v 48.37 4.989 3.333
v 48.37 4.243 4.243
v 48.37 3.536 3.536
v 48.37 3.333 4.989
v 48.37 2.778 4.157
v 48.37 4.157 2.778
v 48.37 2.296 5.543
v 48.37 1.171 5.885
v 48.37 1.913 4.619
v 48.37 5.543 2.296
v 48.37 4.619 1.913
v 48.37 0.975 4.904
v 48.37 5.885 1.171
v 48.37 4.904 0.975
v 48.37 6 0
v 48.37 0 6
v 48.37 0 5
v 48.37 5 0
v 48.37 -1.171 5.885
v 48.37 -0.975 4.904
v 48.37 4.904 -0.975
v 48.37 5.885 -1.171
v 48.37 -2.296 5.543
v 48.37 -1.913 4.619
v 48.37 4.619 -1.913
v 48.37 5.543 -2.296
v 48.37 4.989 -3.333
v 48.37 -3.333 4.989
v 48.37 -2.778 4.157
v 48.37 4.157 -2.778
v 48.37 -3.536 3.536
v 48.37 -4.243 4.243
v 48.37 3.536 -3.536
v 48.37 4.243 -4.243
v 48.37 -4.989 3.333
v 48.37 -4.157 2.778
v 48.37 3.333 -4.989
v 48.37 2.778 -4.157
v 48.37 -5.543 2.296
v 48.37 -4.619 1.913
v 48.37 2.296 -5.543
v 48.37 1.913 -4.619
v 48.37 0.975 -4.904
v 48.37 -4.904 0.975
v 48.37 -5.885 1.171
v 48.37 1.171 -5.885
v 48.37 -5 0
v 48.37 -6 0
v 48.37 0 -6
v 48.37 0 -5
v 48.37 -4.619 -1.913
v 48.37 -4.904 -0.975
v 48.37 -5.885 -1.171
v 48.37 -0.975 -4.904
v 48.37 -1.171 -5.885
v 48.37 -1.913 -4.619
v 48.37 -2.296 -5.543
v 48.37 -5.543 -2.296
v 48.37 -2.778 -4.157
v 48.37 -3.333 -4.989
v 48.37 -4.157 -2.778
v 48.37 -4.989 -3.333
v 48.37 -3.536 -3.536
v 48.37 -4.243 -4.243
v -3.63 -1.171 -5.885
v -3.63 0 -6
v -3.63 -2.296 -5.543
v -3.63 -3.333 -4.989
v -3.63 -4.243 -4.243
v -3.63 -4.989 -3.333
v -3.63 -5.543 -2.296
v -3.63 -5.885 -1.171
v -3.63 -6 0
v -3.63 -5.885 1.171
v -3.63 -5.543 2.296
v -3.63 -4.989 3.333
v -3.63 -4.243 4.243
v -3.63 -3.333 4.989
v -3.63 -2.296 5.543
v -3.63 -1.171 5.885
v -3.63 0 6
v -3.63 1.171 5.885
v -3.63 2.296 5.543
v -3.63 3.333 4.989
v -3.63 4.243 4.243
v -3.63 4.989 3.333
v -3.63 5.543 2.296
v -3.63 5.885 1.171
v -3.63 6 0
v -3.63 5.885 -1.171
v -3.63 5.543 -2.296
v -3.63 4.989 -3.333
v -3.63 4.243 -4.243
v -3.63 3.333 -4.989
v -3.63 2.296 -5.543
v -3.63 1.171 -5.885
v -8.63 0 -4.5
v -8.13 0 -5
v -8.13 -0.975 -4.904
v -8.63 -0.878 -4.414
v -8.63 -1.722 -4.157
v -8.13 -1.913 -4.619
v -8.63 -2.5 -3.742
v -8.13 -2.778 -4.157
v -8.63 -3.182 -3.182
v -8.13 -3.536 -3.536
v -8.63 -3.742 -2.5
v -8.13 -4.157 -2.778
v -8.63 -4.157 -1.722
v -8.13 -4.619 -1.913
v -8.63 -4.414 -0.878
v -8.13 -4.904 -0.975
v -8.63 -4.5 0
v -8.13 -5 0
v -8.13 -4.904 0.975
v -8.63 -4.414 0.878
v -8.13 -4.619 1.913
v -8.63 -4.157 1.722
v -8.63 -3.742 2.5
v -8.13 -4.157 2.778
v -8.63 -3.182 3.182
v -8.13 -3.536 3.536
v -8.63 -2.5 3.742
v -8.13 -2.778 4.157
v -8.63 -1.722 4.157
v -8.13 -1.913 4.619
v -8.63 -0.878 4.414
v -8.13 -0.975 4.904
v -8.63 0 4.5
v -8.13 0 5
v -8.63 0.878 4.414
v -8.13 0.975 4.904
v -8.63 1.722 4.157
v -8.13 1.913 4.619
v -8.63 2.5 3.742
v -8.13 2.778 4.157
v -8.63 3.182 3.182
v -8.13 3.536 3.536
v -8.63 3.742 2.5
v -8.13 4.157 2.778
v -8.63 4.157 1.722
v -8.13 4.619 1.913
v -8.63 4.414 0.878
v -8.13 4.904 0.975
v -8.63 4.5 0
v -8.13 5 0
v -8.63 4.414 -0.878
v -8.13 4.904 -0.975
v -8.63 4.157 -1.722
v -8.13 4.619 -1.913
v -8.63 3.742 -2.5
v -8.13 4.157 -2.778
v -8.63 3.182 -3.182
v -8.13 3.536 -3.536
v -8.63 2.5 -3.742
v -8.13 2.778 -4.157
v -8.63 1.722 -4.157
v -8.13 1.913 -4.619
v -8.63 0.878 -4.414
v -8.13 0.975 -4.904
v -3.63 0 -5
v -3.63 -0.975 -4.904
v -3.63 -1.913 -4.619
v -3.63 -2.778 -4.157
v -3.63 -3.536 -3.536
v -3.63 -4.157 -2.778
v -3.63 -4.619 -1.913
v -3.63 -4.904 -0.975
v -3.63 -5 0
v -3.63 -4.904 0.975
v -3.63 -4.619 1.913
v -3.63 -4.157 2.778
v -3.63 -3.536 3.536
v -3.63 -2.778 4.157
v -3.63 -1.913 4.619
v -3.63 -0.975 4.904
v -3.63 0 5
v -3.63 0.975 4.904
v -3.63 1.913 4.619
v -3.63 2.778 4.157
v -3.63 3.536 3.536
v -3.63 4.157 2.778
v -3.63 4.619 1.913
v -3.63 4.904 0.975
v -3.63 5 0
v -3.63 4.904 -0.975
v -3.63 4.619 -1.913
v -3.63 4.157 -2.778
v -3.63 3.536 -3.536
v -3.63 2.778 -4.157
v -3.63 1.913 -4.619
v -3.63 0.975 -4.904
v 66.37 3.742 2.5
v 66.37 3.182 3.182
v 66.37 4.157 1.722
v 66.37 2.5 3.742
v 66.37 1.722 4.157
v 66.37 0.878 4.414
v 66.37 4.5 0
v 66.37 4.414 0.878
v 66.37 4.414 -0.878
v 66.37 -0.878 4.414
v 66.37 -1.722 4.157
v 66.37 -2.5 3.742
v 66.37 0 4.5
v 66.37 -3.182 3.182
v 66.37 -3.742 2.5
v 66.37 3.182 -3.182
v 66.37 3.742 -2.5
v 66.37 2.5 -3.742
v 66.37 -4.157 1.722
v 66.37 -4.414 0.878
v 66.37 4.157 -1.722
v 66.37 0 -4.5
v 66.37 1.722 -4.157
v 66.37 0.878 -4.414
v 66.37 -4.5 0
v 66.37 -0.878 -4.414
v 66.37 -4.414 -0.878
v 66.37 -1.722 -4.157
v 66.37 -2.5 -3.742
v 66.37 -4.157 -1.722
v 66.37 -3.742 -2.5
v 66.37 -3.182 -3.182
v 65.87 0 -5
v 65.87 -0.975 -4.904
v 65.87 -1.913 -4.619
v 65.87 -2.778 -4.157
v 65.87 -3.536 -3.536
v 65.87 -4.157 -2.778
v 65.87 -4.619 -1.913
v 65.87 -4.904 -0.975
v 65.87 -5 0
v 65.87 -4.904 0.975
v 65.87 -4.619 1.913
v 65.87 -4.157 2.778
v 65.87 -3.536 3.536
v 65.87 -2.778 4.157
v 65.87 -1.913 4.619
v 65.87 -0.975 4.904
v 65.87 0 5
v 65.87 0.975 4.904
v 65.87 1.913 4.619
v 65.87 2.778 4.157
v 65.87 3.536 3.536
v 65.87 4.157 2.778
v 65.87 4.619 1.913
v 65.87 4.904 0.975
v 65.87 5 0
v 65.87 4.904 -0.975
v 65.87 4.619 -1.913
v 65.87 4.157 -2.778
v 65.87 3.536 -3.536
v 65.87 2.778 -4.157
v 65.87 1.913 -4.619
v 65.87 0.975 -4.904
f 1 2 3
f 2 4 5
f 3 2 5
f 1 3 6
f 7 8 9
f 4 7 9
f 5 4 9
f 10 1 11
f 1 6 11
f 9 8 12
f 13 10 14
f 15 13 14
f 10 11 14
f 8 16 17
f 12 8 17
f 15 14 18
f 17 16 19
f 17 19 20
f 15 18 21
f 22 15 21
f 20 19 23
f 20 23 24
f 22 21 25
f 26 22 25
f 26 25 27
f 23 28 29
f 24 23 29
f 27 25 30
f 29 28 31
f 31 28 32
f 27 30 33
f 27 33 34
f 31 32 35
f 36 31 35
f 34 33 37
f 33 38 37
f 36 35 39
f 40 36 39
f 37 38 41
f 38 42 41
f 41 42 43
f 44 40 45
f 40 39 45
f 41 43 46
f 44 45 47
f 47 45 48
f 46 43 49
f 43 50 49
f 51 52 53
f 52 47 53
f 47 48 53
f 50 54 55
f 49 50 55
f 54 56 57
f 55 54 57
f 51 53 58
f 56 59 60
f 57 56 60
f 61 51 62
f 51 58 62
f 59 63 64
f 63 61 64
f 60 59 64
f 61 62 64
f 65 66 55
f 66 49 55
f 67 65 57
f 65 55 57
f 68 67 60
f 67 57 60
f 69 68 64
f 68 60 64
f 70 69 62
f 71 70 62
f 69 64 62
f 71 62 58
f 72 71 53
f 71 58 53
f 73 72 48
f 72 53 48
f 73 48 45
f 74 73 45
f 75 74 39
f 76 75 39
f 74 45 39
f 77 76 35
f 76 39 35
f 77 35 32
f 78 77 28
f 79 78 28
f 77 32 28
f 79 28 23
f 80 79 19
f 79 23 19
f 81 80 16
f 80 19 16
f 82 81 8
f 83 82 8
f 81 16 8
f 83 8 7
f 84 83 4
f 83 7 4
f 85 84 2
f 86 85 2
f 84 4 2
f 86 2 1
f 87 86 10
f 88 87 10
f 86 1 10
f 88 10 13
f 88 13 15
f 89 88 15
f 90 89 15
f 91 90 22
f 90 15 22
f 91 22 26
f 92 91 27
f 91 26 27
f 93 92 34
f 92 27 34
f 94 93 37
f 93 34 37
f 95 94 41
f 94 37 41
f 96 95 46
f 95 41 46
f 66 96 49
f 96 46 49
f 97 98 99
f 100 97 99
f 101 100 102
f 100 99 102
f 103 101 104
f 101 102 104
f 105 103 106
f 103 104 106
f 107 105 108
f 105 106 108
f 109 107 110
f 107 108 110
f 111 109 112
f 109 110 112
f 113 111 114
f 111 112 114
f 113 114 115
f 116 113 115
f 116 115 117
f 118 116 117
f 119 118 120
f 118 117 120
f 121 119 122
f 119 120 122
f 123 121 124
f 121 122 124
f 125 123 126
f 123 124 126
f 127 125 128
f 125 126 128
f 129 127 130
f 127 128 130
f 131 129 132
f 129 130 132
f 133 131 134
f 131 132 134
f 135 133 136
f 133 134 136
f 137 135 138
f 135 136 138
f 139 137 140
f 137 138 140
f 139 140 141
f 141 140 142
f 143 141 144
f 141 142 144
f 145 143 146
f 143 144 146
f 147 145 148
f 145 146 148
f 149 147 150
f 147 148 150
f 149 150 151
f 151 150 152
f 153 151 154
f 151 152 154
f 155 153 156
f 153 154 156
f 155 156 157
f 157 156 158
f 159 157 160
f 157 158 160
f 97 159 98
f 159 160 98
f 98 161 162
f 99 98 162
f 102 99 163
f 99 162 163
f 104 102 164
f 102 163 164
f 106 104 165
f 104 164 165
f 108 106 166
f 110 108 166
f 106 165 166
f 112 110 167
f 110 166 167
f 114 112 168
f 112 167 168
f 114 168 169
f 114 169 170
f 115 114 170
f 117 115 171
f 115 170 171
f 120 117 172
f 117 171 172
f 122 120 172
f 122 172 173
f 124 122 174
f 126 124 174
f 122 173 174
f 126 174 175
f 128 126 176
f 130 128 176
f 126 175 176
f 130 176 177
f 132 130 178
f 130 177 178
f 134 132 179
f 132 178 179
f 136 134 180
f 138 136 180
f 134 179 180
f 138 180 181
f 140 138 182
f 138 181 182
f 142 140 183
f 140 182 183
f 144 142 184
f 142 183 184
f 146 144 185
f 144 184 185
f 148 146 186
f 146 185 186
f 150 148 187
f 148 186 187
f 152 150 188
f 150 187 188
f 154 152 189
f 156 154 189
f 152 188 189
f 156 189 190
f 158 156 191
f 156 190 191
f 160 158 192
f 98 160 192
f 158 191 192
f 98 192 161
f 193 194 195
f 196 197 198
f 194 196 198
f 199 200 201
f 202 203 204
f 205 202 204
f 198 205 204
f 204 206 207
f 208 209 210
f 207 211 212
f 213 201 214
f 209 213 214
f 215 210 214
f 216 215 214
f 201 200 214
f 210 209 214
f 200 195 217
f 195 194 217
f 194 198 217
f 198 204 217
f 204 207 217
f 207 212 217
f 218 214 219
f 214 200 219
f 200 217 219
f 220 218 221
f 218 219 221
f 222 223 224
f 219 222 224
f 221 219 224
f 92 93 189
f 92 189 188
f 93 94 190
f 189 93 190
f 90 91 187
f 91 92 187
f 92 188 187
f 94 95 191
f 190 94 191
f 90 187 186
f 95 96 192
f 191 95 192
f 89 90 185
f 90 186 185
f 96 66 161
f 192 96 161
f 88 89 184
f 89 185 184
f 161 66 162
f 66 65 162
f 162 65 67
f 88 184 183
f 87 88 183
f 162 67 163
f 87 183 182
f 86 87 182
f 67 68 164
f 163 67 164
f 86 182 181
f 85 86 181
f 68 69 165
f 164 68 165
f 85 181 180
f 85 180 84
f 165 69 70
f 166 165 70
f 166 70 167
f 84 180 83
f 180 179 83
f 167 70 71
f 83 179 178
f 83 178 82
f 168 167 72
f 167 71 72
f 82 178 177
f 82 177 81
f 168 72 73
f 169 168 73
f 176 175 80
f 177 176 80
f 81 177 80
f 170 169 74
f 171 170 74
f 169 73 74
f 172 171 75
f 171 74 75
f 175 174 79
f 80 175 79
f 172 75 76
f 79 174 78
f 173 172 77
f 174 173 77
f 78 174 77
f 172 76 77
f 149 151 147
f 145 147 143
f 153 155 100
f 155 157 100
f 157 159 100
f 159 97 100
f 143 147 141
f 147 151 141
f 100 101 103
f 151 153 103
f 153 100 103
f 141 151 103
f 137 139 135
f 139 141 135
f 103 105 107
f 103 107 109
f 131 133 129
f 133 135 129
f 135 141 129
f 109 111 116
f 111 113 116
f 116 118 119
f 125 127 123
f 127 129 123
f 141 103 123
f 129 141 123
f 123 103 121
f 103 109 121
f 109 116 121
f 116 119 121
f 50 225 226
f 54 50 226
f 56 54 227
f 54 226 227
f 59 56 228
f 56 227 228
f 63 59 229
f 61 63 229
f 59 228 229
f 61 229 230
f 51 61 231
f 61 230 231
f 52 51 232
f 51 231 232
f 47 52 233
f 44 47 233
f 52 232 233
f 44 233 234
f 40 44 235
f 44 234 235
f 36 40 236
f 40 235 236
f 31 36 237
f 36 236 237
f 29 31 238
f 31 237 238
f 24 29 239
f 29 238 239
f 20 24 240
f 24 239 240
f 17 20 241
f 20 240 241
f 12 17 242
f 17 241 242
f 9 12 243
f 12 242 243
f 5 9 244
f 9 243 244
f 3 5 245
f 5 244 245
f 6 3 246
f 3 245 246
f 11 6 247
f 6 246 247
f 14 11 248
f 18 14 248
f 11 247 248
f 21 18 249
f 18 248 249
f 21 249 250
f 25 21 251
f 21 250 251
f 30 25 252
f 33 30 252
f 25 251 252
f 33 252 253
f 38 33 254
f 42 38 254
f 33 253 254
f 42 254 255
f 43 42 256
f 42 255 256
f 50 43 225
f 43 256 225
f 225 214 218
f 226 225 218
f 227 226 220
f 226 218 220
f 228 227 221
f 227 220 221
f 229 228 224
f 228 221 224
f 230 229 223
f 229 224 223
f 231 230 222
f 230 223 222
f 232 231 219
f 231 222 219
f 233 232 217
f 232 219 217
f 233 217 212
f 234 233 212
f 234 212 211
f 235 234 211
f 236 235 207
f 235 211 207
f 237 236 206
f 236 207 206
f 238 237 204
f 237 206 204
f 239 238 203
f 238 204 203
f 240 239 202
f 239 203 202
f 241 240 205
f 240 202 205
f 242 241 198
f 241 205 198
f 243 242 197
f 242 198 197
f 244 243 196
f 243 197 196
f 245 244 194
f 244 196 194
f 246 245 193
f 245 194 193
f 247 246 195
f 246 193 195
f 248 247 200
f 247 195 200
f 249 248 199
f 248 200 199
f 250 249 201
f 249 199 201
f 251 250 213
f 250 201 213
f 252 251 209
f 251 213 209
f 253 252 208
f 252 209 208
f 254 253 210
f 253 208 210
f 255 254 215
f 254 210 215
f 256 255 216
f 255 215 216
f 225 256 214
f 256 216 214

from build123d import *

# Parameters (mm, degrees)
CHAMFER_1_SIZE = 0.5


with BuildPart() as part:
    # 草图1 → 旋转1 (revolve)
    with BuildSketch(Plane(origin=(0, 0, 0), x_dir=(1, 0, 0), z_dir=(0, 1, 0))):
        Polygon((-8.630363036, 0), (-8.630363036, 5), (-3.630363036, 5), (-3.630363036, 6), (48.369636964, 6), (48.369636964, 5), (66.369636964, 5), (66.369636964, 0), align=None)
    revolve(axis=Axis((66.369636964, 0, 0), (-1, 0, 0)))

    # 倒角1
    chamfer_1_edges = [part.edges().sort_by_distance(p)[0] for p in [
        (66.369636964, 0, 5),
        (-8.630363036, 0, 5),
    ]]
    chamfer(chamfer_1_edges, length=CHAMFER_1_SIZE)


solid = part.part
